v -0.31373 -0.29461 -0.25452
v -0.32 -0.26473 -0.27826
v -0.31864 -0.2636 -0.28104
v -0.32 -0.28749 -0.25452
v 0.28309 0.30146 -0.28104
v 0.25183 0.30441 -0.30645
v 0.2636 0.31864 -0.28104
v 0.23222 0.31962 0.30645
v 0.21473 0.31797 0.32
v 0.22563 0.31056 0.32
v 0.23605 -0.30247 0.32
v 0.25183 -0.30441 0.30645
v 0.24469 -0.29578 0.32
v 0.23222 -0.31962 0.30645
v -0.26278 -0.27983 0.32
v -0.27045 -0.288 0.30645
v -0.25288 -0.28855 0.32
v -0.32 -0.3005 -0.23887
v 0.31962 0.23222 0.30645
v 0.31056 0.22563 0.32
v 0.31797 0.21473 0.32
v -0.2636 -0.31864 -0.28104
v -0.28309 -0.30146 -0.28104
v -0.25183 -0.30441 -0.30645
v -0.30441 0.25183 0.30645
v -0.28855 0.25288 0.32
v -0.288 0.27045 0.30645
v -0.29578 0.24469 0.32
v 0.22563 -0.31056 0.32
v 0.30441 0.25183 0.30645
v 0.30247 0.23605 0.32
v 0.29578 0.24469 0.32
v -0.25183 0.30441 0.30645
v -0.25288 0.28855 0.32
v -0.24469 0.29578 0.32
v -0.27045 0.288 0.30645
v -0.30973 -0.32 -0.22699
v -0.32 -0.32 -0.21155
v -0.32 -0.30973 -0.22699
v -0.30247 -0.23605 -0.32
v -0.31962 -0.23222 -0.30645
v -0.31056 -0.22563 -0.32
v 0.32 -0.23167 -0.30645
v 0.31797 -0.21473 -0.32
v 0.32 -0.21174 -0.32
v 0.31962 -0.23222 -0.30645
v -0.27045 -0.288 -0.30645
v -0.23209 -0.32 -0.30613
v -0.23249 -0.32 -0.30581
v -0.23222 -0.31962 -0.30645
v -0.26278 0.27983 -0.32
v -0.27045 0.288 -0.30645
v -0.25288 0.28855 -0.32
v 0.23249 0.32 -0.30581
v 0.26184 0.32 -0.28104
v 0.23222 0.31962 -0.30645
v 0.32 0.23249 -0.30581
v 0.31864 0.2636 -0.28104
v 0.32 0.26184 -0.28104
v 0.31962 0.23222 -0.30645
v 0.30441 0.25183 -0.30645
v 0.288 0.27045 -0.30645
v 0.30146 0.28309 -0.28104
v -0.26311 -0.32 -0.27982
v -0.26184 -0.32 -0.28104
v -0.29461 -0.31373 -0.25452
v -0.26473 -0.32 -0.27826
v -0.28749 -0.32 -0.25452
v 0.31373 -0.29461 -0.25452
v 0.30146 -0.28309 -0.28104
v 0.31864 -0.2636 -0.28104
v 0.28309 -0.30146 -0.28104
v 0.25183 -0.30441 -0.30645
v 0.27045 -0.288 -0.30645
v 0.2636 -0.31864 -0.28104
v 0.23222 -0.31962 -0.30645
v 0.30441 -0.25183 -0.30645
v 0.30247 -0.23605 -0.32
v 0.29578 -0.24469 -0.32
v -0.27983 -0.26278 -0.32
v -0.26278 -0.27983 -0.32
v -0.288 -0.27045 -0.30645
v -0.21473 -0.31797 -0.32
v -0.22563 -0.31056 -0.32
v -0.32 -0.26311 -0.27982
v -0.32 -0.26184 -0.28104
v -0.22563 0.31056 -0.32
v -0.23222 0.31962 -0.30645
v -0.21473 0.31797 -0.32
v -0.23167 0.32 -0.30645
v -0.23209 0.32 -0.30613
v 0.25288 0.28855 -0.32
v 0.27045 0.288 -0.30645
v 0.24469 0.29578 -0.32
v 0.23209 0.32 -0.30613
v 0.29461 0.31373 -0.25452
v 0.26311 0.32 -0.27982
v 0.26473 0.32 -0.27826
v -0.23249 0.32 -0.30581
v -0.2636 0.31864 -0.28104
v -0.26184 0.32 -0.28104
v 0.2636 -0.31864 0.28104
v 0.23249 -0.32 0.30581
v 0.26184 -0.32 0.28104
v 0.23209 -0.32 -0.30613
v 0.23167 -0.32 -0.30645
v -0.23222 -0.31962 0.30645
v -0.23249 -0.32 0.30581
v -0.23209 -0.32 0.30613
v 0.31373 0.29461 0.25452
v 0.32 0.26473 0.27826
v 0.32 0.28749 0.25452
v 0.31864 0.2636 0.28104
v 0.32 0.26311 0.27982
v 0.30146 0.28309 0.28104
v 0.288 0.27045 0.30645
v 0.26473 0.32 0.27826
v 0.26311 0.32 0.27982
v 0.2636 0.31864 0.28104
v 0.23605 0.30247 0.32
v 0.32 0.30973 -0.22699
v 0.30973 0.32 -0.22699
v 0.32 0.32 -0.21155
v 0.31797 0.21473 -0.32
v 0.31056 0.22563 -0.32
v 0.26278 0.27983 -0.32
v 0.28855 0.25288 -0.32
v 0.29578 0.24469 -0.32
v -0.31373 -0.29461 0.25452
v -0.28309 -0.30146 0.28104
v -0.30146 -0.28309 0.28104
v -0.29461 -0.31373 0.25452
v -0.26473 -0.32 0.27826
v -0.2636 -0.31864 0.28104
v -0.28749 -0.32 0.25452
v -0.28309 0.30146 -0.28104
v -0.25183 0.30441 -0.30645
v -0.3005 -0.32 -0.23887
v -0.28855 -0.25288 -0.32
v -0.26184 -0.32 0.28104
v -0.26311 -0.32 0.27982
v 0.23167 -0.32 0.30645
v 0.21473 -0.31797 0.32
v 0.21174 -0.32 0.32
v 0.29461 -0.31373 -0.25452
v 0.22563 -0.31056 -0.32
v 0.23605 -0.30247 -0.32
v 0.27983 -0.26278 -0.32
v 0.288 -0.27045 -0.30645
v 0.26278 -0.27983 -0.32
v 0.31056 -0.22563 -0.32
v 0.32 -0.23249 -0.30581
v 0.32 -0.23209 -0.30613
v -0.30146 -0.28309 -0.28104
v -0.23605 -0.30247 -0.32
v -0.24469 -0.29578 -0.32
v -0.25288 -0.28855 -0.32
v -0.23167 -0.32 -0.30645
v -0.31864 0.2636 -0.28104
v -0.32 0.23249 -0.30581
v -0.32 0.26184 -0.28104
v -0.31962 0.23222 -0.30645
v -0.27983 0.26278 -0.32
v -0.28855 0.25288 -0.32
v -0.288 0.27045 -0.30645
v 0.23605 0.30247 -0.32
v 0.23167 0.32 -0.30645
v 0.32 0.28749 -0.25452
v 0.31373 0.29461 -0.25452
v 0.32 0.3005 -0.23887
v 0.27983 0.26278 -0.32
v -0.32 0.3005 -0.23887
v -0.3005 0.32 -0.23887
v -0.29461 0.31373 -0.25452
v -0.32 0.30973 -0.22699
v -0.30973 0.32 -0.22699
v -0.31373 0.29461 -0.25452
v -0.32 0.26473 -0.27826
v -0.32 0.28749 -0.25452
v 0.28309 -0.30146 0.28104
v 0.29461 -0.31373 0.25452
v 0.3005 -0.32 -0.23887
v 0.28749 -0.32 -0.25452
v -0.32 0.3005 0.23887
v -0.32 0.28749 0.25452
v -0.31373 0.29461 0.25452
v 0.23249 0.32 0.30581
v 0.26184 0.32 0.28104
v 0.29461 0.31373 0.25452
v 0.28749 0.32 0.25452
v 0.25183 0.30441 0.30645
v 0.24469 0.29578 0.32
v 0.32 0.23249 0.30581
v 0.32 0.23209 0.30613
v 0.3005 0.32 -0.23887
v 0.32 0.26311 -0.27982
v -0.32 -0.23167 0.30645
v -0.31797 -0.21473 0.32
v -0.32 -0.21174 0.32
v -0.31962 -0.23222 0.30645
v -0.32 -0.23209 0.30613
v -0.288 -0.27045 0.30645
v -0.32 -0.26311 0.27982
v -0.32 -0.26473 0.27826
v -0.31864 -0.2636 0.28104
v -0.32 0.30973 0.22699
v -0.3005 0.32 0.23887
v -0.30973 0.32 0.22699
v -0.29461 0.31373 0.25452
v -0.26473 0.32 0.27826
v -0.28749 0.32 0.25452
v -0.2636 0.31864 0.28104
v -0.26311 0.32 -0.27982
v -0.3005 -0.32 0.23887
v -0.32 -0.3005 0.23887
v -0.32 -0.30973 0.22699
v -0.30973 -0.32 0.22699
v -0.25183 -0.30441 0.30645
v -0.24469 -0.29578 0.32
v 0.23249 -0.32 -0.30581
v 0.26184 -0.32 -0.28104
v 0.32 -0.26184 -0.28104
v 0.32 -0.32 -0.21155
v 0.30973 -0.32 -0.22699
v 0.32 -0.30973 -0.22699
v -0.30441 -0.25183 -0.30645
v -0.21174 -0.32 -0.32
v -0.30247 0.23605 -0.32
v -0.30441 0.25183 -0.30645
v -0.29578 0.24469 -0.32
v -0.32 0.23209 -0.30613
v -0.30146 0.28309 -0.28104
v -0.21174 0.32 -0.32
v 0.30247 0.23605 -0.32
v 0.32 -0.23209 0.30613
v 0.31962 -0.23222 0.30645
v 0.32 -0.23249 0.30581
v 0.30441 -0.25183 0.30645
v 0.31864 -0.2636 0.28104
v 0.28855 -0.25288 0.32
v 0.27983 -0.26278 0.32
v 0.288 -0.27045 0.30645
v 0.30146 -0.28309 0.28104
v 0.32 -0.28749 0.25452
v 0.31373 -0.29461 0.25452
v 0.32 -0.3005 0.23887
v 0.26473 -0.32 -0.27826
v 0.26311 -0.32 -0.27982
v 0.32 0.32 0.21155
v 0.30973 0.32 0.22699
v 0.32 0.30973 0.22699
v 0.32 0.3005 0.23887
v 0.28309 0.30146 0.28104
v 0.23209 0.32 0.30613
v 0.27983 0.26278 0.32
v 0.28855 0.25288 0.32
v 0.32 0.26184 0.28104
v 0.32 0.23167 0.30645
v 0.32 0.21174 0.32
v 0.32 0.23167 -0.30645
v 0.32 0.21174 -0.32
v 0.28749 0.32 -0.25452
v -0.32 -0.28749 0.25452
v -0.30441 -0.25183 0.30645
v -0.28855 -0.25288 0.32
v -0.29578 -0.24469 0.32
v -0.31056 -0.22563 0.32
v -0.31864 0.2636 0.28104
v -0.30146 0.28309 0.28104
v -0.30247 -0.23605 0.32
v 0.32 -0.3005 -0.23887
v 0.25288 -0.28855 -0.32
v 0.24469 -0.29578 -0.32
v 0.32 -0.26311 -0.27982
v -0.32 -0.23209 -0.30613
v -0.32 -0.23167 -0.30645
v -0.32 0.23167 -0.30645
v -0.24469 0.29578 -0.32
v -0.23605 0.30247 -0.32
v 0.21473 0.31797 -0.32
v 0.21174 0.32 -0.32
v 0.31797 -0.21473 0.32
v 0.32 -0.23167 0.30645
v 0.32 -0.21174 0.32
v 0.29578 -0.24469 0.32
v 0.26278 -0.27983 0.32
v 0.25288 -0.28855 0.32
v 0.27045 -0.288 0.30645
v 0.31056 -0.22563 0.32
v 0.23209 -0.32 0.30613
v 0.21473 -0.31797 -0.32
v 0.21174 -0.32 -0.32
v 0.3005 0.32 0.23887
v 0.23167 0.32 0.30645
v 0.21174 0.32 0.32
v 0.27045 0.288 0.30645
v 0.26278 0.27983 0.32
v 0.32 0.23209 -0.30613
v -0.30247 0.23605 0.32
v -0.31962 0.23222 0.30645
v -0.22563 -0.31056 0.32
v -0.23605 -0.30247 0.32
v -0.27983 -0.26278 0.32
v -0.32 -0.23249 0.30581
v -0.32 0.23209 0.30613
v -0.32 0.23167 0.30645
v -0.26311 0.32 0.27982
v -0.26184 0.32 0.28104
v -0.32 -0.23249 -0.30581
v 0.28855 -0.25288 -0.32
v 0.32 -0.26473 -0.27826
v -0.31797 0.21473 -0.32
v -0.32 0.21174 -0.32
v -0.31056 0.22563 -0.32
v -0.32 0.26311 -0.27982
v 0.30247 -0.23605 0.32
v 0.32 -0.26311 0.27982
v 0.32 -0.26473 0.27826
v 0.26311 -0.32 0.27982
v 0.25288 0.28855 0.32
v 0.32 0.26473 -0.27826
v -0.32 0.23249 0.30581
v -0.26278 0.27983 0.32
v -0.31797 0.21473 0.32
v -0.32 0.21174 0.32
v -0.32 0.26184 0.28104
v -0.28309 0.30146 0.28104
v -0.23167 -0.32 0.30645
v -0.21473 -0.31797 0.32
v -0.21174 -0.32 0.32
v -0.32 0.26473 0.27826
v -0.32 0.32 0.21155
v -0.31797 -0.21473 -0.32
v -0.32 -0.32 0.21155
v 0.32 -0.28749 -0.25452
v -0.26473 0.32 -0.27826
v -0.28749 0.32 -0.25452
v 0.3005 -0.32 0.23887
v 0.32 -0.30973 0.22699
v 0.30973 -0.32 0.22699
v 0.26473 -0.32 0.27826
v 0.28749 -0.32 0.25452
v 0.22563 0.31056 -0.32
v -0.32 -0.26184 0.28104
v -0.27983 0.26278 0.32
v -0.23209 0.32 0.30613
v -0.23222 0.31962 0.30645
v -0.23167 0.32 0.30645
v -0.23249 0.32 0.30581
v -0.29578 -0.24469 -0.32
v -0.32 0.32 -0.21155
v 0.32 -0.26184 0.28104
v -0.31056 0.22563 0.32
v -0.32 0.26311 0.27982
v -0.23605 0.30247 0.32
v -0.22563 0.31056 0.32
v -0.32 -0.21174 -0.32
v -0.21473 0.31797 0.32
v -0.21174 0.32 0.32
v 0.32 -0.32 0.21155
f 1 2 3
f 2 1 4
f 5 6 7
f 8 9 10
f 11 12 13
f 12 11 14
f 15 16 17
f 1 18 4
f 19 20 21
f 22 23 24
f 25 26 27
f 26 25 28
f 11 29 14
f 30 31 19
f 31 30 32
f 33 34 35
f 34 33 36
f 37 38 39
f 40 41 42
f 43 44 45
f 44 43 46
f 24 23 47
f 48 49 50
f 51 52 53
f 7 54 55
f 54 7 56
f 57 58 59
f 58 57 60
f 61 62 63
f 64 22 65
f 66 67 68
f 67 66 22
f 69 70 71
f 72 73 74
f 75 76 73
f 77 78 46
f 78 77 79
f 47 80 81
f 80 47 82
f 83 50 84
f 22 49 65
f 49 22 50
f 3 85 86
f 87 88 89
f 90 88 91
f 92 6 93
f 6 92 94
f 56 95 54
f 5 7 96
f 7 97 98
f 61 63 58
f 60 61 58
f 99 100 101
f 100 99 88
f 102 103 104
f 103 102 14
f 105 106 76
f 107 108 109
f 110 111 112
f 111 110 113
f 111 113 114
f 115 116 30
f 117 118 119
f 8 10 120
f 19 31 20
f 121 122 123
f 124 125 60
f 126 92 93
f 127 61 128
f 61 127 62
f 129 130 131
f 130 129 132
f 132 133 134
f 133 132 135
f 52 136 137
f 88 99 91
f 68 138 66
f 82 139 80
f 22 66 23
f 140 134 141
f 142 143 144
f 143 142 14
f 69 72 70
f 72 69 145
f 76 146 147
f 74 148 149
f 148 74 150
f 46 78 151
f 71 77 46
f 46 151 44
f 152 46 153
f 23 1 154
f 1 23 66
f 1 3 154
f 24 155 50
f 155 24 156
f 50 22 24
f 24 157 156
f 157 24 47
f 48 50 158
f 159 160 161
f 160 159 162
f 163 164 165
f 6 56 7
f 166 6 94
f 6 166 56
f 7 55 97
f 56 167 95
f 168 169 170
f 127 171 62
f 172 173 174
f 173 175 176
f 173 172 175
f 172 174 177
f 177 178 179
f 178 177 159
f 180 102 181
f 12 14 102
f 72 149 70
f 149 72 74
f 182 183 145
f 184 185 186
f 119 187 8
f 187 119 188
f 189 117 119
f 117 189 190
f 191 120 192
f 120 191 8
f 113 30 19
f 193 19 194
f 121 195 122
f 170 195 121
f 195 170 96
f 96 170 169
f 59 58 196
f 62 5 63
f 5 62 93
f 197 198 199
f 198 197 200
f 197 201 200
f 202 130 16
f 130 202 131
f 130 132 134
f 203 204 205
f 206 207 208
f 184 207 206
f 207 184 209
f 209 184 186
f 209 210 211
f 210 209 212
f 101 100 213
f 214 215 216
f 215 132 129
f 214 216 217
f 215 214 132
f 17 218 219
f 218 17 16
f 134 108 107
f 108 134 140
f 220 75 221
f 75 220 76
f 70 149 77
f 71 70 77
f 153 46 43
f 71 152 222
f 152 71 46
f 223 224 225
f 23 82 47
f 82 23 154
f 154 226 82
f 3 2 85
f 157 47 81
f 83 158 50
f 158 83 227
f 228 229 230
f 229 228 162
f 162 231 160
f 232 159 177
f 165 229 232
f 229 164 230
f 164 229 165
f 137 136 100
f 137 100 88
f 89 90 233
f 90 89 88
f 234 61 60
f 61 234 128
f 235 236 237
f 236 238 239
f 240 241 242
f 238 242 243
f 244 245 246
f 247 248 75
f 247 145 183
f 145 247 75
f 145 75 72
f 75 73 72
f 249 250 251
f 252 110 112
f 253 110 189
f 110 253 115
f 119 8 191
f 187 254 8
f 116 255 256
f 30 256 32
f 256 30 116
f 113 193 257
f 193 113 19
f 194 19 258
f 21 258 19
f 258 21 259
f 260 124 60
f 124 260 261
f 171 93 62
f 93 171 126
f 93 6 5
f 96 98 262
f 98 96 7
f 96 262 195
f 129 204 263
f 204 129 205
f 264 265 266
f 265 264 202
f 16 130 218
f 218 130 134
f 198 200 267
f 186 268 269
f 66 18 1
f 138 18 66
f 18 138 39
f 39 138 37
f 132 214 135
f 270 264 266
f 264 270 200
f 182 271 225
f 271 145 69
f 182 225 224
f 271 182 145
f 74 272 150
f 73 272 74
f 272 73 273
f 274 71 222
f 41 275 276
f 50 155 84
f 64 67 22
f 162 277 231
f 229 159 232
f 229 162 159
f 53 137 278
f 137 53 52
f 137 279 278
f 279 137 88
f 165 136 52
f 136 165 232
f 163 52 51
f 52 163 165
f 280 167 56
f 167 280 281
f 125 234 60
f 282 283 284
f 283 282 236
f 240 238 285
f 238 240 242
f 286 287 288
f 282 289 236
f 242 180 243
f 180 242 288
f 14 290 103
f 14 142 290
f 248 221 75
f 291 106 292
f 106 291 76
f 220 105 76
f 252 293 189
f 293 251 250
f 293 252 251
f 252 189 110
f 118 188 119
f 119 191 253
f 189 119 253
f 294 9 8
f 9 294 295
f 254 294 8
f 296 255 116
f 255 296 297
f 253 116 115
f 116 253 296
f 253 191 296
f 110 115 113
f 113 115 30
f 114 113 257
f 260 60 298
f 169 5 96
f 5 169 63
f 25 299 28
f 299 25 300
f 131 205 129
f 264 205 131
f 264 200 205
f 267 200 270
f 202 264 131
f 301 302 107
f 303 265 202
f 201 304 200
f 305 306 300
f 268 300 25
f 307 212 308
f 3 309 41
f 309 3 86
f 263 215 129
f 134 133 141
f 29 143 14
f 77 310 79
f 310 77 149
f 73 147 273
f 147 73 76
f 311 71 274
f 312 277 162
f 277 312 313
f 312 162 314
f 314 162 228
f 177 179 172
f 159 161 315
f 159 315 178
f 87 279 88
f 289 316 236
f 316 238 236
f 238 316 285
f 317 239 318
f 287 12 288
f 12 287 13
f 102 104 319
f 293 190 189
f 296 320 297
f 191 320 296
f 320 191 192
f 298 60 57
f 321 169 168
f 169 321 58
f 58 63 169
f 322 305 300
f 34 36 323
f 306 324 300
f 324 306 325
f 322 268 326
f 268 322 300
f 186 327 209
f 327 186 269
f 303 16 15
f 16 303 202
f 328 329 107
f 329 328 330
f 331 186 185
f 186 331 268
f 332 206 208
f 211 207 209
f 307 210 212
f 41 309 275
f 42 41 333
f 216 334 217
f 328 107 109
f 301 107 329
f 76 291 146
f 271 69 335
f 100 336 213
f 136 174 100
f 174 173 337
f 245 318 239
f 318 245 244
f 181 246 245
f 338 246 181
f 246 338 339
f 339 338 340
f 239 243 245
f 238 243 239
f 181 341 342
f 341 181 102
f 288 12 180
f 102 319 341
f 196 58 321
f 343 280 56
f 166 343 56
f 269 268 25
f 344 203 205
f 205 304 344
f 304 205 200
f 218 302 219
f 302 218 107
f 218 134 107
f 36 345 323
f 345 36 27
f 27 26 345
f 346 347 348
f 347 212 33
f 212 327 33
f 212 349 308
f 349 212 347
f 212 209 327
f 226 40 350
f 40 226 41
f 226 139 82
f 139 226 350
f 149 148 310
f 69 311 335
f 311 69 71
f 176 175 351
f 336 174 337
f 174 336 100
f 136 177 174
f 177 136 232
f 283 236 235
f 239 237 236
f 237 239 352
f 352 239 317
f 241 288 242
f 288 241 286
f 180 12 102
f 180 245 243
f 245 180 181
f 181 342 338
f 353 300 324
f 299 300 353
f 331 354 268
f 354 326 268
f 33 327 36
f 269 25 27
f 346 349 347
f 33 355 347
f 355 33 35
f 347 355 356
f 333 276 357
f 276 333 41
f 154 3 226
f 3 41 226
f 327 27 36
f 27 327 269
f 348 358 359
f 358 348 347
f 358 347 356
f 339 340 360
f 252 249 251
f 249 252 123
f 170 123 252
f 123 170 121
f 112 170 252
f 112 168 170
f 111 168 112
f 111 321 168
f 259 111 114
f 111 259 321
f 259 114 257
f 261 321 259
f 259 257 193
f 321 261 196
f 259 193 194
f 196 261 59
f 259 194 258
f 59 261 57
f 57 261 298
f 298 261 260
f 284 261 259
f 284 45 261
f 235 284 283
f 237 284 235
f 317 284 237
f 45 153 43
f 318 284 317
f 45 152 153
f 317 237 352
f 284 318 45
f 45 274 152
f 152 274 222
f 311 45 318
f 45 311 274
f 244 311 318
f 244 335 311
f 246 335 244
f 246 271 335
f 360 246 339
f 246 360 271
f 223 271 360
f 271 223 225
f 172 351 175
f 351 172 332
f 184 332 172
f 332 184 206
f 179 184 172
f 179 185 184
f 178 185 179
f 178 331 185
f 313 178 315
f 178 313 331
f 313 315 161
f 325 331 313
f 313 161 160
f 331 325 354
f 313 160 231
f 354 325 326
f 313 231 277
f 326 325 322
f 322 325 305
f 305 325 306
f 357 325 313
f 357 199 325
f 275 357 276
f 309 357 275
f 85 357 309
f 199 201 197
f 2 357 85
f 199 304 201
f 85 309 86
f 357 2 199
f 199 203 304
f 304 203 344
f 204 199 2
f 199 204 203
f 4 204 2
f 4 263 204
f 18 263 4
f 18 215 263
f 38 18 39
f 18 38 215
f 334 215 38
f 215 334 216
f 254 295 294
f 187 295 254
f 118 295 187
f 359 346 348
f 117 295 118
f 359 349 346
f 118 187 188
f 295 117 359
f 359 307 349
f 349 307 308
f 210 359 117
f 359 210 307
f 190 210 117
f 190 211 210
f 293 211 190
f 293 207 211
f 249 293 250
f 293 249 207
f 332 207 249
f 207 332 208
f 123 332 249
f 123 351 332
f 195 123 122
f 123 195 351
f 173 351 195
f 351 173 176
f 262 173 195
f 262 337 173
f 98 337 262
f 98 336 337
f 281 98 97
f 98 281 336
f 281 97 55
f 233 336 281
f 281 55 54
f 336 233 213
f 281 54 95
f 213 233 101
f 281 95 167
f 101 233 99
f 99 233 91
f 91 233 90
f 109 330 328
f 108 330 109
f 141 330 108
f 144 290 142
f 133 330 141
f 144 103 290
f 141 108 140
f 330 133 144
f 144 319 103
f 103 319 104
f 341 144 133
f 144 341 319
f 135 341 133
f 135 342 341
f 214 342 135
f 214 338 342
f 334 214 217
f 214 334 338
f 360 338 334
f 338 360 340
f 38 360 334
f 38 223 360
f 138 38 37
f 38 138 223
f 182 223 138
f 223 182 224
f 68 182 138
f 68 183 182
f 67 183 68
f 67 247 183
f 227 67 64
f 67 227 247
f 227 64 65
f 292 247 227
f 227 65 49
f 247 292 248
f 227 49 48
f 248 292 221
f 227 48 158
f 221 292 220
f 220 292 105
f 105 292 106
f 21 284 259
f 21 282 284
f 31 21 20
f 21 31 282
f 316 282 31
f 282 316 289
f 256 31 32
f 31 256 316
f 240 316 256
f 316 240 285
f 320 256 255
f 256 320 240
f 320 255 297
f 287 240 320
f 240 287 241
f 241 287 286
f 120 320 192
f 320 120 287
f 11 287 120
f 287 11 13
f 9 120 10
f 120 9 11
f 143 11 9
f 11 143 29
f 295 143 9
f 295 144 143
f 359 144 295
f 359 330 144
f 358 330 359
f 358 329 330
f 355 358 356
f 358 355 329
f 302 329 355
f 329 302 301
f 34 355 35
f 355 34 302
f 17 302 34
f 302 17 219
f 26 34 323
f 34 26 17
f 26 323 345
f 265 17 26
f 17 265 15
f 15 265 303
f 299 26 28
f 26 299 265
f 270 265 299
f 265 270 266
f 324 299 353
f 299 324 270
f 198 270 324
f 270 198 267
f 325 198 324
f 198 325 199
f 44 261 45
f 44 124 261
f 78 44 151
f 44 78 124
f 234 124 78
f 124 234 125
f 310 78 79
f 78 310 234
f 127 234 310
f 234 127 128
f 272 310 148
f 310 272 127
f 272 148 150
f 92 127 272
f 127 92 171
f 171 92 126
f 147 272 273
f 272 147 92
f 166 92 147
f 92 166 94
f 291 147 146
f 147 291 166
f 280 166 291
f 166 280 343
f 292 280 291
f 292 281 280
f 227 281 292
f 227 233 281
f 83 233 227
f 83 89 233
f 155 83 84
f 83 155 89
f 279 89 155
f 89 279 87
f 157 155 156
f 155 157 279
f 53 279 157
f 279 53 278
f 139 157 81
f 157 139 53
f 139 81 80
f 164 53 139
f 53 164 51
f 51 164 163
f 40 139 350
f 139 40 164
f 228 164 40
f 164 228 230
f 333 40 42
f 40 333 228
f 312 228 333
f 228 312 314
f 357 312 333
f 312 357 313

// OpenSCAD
r = .82;

difference() {
  sphere($fn = 100, d = 1);

  translate([ r, 0, 0])
    cube(1, true);

  translate([-r, 0, 0])
    cube(1, true);

  translate([0,  r, 0])
    cube(1, true);

  translate([0, -r, 0])
    cube(1, true);

  translate([0, 0,  r])
    cube(1, true);

  translate([0, 0, -r])
    cube(1, true);
}
